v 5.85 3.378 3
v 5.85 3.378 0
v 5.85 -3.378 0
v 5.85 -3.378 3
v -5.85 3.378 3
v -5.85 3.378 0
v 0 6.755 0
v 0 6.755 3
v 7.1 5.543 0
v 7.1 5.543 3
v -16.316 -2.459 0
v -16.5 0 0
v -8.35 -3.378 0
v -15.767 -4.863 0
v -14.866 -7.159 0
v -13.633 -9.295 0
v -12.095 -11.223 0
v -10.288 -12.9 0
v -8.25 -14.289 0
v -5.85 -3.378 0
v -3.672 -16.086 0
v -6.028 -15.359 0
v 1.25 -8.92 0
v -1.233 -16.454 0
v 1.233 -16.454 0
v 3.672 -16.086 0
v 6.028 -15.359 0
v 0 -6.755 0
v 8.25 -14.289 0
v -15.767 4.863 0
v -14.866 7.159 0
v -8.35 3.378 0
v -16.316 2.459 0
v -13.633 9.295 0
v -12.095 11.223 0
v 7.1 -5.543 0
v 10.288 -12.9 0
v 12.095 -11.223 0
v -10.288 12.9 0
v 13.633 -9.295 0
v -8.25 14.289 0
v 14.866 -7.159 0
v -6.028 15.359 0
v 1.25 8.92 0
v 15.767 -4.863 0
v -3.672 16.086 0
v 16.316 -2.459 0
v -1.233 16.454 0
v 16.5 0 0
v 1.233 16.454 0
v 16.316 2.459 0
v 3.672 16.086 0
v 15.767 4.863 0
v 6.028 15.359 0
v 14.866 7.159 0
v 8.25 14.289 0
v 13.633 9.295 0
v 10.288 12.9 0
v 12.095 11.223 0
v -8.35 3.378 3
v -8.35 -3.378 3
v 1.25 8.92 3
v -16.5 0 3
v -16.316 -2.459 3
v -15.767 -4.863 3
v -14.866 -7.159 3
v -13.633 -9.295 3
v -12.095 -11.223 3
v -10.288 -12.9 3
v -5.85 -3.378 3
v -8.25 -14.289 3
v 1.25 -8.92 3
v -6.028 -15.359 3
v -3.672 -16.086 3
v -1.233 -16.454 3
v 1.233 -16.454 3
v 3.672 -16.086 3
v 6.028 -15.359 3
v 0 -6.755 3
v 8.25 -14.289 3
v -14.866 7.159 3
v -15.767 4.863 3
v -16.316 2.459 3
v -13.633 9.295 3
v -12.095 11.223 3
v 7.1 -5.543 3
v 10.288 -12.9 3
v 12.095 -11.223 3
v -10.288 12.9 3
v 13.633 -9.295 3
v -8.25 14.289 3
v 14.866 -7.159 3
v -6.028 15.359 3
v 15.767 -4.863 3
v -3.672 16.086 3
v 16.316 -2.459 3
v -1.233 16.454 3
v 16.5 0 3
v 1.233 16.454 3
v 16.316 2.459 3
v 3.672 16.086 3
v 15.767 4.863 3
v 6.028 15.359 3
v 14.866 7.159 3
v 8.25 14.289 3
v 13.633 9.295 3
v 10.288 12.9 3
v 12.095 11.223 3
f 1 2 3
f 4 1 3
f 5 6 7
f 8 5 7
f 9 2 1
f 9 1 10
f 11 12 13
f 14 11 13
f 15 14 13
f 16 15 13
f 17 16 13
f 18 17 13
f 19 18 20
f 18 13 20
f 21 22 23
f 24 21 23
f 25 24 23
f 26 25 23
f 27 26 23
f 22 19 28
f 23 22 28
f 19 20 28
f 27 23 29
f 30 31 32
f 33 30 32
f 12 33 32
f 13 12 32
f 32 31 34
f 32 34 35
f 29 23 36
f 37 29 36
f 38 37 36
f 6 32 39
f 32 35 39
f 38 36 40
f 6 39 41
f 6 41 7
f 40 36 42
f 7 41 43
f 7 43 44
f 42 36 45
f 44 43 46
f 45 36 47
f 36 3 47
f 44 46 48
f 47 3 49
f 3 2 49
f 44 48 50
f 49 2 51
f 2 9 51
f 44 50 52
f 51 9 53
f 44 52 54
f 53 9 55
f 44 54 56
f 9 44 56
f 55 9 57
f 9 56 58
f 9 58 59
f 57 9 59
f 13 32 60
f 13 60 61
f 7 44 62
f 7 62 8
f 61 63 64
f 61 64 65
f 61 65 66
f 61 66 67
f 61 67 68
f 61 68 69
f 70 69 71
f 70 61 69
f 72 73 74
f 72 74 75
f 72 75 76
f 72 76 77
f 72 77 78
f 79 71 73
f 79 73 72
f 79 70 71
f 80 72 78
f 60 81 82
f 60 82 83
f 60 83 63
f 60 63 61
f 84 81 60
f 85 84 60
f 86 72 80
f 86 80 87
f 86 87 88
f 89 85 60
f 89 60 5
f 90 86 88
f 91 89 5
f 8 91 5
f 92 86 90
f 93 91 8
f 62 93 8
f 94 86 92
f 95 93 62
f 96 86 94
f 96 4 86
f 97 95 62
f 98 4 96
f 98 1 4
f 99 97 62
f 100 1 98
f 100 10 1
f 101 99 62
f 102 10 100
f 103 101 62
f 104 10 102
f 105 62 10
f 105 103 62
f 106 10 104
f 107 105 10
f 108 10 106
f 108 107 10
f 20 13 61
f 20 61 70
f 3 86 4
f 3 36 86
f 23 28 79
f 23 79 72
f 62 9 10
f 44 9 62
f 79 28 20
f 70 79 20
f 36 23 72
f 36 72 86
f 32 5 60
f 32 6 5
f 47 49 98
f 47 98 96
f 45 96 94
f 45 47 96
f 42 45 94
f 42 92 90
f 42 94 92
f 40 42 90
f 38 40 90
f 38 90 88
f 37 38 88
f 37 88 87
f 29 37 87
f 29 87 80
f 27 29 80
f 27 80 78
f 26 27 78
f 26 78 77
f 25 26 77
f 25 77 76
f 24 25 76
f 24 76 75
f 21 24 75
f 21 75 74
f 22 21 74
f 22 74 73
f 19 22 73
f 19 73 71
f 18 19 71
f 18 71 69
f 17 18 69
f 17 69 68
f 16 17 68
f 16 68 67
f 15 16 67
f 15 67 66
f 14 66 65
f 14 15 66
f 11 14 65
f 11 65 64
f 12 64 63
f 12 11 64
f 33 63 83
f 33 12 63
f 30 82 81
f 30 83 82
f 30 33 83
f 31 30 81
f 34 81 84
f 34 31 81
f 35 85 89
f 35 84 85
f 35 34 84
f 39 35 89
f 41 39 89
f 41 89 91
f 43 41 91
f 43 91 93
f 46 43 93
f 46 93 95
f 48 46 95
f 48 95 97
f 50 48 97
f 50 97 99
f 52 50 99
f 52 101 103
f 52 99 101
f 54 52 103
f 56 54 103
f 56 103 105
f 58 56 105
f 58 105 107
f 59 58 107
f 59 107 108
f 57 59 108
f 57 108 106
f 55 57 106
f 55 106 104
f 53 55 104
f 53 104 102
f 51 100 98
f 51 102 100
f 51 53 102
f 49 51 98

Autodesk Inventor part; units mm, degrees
ref_plane "YZ Plane" through (0, 0, 0) normal (1, 0, 0) x (0, 1, 0)
ref_plane "XZ Plane" through (0, 0, 0) normal (0, 1, 0) x (-1, 0, 0)
ref_plane "XY Plane" through (0, 0, 0) normal (0, 0, 1) x (1, 0, 0)
sketch "草圖1" plane through (0, 0, 0) normal (0, 0, 1) x (1, 0, 0)
  line L0 (5.85, -3.3775) -> (0, -6.755)
  line L1 (5.85, 3.3775) -> (5.85, -3.3775)
  line L2 (0, 6.755) -> (5.85, 3.3775)
  line L3 (-5.85, 3.3775) -> (0, 6.755)
  line L4 (-5.85, -3.3775) -> (-5.85, 3.3775)
  line L5 (0, -6.755) -> (-5.85, -3.3775)
  line L6 (-5.85, 3.3775) -> (0, 6.755)
  line L7 (0, 6.755) -> (5.85, 3.3775)
  line L8 (0, 6.755) -> (5.85, 3.3775)
  line L9 (5.85, 3.3775) -> (7.1, 5.5426)
  line L10 (7.1, 5.5426) -> (1.25, 8.9201)
  line L11 (1.25, 8.9201) -> (0, 6.755)
  line L12 (-5.85, -3.3775) -> (-5.85, 3.3775)
  line L13 (-5.85, 3.3775) -> (-8.35, 3.3775)
  line L14 (-8.35, 3.3775) -> (-8.35, -3.3775)
  line L15 (-8.35, -3.3775) -> (-5.85, -3.3775)
  line L16 (5.85, -3.3775) -> (0, -6.755)
  line L17 (0, -6.755) -> (1.25, -8.9201)
  line L18 (1.25, -8.9201) -> (7.1, -5.5426)
  line L19 (7.1, -5.5426) -> (5.85, -3.3775)
  circle A0 centre (0, 0) radius 16.5
  point P0 (0, -6.755)
  dimension "d2" = 2.5
  dimension "d3" = 360
  dimension "d4" = 33
extrude "擠出1" add sketch "草圖1" along normal blind 3
sketch "草圖2" plane through (0, 0, 3) normal (0, 0, 1) x (1, 0, 0)
  circle A0 centre (0, 0) radius 16.5 projected
  line L0 (0, 6.755) -> (1.25, 8.9201) projected
  line L1 (1.25, 8.9201) -> (7.1, 5.5426) projected
  line L2 (7.1, 5.5426) -> (5.85, 3.3775) projected
  line L3 (5.85, 3.3775) -> (5.85, -3.3775) projected
  line L4 (5.85, -3.3775) -> (7.1, -5.5426) projected
  line L5 (7.1, -5.5426) -> (1.25, -8.9201) projected
  line L6 (1.25, -8.9201) -> (0, -6.755) projected
  line L7 (0, -6.755) -> (-5.85, -3.3775) projected
  line L8 (-5.85, -3.3775) -> (-8.35, -3.3775) projected
  line L9 (-8.35, -3.3775) -> (-8.35, 3.3775) projected
  line L10 (-8.35, 3.3775) -> (-5.85, 3.3775) projected
  line L11 (-5.85, 3.3775) -> (0, 6.755) projected
properties part number "2GTbase"
